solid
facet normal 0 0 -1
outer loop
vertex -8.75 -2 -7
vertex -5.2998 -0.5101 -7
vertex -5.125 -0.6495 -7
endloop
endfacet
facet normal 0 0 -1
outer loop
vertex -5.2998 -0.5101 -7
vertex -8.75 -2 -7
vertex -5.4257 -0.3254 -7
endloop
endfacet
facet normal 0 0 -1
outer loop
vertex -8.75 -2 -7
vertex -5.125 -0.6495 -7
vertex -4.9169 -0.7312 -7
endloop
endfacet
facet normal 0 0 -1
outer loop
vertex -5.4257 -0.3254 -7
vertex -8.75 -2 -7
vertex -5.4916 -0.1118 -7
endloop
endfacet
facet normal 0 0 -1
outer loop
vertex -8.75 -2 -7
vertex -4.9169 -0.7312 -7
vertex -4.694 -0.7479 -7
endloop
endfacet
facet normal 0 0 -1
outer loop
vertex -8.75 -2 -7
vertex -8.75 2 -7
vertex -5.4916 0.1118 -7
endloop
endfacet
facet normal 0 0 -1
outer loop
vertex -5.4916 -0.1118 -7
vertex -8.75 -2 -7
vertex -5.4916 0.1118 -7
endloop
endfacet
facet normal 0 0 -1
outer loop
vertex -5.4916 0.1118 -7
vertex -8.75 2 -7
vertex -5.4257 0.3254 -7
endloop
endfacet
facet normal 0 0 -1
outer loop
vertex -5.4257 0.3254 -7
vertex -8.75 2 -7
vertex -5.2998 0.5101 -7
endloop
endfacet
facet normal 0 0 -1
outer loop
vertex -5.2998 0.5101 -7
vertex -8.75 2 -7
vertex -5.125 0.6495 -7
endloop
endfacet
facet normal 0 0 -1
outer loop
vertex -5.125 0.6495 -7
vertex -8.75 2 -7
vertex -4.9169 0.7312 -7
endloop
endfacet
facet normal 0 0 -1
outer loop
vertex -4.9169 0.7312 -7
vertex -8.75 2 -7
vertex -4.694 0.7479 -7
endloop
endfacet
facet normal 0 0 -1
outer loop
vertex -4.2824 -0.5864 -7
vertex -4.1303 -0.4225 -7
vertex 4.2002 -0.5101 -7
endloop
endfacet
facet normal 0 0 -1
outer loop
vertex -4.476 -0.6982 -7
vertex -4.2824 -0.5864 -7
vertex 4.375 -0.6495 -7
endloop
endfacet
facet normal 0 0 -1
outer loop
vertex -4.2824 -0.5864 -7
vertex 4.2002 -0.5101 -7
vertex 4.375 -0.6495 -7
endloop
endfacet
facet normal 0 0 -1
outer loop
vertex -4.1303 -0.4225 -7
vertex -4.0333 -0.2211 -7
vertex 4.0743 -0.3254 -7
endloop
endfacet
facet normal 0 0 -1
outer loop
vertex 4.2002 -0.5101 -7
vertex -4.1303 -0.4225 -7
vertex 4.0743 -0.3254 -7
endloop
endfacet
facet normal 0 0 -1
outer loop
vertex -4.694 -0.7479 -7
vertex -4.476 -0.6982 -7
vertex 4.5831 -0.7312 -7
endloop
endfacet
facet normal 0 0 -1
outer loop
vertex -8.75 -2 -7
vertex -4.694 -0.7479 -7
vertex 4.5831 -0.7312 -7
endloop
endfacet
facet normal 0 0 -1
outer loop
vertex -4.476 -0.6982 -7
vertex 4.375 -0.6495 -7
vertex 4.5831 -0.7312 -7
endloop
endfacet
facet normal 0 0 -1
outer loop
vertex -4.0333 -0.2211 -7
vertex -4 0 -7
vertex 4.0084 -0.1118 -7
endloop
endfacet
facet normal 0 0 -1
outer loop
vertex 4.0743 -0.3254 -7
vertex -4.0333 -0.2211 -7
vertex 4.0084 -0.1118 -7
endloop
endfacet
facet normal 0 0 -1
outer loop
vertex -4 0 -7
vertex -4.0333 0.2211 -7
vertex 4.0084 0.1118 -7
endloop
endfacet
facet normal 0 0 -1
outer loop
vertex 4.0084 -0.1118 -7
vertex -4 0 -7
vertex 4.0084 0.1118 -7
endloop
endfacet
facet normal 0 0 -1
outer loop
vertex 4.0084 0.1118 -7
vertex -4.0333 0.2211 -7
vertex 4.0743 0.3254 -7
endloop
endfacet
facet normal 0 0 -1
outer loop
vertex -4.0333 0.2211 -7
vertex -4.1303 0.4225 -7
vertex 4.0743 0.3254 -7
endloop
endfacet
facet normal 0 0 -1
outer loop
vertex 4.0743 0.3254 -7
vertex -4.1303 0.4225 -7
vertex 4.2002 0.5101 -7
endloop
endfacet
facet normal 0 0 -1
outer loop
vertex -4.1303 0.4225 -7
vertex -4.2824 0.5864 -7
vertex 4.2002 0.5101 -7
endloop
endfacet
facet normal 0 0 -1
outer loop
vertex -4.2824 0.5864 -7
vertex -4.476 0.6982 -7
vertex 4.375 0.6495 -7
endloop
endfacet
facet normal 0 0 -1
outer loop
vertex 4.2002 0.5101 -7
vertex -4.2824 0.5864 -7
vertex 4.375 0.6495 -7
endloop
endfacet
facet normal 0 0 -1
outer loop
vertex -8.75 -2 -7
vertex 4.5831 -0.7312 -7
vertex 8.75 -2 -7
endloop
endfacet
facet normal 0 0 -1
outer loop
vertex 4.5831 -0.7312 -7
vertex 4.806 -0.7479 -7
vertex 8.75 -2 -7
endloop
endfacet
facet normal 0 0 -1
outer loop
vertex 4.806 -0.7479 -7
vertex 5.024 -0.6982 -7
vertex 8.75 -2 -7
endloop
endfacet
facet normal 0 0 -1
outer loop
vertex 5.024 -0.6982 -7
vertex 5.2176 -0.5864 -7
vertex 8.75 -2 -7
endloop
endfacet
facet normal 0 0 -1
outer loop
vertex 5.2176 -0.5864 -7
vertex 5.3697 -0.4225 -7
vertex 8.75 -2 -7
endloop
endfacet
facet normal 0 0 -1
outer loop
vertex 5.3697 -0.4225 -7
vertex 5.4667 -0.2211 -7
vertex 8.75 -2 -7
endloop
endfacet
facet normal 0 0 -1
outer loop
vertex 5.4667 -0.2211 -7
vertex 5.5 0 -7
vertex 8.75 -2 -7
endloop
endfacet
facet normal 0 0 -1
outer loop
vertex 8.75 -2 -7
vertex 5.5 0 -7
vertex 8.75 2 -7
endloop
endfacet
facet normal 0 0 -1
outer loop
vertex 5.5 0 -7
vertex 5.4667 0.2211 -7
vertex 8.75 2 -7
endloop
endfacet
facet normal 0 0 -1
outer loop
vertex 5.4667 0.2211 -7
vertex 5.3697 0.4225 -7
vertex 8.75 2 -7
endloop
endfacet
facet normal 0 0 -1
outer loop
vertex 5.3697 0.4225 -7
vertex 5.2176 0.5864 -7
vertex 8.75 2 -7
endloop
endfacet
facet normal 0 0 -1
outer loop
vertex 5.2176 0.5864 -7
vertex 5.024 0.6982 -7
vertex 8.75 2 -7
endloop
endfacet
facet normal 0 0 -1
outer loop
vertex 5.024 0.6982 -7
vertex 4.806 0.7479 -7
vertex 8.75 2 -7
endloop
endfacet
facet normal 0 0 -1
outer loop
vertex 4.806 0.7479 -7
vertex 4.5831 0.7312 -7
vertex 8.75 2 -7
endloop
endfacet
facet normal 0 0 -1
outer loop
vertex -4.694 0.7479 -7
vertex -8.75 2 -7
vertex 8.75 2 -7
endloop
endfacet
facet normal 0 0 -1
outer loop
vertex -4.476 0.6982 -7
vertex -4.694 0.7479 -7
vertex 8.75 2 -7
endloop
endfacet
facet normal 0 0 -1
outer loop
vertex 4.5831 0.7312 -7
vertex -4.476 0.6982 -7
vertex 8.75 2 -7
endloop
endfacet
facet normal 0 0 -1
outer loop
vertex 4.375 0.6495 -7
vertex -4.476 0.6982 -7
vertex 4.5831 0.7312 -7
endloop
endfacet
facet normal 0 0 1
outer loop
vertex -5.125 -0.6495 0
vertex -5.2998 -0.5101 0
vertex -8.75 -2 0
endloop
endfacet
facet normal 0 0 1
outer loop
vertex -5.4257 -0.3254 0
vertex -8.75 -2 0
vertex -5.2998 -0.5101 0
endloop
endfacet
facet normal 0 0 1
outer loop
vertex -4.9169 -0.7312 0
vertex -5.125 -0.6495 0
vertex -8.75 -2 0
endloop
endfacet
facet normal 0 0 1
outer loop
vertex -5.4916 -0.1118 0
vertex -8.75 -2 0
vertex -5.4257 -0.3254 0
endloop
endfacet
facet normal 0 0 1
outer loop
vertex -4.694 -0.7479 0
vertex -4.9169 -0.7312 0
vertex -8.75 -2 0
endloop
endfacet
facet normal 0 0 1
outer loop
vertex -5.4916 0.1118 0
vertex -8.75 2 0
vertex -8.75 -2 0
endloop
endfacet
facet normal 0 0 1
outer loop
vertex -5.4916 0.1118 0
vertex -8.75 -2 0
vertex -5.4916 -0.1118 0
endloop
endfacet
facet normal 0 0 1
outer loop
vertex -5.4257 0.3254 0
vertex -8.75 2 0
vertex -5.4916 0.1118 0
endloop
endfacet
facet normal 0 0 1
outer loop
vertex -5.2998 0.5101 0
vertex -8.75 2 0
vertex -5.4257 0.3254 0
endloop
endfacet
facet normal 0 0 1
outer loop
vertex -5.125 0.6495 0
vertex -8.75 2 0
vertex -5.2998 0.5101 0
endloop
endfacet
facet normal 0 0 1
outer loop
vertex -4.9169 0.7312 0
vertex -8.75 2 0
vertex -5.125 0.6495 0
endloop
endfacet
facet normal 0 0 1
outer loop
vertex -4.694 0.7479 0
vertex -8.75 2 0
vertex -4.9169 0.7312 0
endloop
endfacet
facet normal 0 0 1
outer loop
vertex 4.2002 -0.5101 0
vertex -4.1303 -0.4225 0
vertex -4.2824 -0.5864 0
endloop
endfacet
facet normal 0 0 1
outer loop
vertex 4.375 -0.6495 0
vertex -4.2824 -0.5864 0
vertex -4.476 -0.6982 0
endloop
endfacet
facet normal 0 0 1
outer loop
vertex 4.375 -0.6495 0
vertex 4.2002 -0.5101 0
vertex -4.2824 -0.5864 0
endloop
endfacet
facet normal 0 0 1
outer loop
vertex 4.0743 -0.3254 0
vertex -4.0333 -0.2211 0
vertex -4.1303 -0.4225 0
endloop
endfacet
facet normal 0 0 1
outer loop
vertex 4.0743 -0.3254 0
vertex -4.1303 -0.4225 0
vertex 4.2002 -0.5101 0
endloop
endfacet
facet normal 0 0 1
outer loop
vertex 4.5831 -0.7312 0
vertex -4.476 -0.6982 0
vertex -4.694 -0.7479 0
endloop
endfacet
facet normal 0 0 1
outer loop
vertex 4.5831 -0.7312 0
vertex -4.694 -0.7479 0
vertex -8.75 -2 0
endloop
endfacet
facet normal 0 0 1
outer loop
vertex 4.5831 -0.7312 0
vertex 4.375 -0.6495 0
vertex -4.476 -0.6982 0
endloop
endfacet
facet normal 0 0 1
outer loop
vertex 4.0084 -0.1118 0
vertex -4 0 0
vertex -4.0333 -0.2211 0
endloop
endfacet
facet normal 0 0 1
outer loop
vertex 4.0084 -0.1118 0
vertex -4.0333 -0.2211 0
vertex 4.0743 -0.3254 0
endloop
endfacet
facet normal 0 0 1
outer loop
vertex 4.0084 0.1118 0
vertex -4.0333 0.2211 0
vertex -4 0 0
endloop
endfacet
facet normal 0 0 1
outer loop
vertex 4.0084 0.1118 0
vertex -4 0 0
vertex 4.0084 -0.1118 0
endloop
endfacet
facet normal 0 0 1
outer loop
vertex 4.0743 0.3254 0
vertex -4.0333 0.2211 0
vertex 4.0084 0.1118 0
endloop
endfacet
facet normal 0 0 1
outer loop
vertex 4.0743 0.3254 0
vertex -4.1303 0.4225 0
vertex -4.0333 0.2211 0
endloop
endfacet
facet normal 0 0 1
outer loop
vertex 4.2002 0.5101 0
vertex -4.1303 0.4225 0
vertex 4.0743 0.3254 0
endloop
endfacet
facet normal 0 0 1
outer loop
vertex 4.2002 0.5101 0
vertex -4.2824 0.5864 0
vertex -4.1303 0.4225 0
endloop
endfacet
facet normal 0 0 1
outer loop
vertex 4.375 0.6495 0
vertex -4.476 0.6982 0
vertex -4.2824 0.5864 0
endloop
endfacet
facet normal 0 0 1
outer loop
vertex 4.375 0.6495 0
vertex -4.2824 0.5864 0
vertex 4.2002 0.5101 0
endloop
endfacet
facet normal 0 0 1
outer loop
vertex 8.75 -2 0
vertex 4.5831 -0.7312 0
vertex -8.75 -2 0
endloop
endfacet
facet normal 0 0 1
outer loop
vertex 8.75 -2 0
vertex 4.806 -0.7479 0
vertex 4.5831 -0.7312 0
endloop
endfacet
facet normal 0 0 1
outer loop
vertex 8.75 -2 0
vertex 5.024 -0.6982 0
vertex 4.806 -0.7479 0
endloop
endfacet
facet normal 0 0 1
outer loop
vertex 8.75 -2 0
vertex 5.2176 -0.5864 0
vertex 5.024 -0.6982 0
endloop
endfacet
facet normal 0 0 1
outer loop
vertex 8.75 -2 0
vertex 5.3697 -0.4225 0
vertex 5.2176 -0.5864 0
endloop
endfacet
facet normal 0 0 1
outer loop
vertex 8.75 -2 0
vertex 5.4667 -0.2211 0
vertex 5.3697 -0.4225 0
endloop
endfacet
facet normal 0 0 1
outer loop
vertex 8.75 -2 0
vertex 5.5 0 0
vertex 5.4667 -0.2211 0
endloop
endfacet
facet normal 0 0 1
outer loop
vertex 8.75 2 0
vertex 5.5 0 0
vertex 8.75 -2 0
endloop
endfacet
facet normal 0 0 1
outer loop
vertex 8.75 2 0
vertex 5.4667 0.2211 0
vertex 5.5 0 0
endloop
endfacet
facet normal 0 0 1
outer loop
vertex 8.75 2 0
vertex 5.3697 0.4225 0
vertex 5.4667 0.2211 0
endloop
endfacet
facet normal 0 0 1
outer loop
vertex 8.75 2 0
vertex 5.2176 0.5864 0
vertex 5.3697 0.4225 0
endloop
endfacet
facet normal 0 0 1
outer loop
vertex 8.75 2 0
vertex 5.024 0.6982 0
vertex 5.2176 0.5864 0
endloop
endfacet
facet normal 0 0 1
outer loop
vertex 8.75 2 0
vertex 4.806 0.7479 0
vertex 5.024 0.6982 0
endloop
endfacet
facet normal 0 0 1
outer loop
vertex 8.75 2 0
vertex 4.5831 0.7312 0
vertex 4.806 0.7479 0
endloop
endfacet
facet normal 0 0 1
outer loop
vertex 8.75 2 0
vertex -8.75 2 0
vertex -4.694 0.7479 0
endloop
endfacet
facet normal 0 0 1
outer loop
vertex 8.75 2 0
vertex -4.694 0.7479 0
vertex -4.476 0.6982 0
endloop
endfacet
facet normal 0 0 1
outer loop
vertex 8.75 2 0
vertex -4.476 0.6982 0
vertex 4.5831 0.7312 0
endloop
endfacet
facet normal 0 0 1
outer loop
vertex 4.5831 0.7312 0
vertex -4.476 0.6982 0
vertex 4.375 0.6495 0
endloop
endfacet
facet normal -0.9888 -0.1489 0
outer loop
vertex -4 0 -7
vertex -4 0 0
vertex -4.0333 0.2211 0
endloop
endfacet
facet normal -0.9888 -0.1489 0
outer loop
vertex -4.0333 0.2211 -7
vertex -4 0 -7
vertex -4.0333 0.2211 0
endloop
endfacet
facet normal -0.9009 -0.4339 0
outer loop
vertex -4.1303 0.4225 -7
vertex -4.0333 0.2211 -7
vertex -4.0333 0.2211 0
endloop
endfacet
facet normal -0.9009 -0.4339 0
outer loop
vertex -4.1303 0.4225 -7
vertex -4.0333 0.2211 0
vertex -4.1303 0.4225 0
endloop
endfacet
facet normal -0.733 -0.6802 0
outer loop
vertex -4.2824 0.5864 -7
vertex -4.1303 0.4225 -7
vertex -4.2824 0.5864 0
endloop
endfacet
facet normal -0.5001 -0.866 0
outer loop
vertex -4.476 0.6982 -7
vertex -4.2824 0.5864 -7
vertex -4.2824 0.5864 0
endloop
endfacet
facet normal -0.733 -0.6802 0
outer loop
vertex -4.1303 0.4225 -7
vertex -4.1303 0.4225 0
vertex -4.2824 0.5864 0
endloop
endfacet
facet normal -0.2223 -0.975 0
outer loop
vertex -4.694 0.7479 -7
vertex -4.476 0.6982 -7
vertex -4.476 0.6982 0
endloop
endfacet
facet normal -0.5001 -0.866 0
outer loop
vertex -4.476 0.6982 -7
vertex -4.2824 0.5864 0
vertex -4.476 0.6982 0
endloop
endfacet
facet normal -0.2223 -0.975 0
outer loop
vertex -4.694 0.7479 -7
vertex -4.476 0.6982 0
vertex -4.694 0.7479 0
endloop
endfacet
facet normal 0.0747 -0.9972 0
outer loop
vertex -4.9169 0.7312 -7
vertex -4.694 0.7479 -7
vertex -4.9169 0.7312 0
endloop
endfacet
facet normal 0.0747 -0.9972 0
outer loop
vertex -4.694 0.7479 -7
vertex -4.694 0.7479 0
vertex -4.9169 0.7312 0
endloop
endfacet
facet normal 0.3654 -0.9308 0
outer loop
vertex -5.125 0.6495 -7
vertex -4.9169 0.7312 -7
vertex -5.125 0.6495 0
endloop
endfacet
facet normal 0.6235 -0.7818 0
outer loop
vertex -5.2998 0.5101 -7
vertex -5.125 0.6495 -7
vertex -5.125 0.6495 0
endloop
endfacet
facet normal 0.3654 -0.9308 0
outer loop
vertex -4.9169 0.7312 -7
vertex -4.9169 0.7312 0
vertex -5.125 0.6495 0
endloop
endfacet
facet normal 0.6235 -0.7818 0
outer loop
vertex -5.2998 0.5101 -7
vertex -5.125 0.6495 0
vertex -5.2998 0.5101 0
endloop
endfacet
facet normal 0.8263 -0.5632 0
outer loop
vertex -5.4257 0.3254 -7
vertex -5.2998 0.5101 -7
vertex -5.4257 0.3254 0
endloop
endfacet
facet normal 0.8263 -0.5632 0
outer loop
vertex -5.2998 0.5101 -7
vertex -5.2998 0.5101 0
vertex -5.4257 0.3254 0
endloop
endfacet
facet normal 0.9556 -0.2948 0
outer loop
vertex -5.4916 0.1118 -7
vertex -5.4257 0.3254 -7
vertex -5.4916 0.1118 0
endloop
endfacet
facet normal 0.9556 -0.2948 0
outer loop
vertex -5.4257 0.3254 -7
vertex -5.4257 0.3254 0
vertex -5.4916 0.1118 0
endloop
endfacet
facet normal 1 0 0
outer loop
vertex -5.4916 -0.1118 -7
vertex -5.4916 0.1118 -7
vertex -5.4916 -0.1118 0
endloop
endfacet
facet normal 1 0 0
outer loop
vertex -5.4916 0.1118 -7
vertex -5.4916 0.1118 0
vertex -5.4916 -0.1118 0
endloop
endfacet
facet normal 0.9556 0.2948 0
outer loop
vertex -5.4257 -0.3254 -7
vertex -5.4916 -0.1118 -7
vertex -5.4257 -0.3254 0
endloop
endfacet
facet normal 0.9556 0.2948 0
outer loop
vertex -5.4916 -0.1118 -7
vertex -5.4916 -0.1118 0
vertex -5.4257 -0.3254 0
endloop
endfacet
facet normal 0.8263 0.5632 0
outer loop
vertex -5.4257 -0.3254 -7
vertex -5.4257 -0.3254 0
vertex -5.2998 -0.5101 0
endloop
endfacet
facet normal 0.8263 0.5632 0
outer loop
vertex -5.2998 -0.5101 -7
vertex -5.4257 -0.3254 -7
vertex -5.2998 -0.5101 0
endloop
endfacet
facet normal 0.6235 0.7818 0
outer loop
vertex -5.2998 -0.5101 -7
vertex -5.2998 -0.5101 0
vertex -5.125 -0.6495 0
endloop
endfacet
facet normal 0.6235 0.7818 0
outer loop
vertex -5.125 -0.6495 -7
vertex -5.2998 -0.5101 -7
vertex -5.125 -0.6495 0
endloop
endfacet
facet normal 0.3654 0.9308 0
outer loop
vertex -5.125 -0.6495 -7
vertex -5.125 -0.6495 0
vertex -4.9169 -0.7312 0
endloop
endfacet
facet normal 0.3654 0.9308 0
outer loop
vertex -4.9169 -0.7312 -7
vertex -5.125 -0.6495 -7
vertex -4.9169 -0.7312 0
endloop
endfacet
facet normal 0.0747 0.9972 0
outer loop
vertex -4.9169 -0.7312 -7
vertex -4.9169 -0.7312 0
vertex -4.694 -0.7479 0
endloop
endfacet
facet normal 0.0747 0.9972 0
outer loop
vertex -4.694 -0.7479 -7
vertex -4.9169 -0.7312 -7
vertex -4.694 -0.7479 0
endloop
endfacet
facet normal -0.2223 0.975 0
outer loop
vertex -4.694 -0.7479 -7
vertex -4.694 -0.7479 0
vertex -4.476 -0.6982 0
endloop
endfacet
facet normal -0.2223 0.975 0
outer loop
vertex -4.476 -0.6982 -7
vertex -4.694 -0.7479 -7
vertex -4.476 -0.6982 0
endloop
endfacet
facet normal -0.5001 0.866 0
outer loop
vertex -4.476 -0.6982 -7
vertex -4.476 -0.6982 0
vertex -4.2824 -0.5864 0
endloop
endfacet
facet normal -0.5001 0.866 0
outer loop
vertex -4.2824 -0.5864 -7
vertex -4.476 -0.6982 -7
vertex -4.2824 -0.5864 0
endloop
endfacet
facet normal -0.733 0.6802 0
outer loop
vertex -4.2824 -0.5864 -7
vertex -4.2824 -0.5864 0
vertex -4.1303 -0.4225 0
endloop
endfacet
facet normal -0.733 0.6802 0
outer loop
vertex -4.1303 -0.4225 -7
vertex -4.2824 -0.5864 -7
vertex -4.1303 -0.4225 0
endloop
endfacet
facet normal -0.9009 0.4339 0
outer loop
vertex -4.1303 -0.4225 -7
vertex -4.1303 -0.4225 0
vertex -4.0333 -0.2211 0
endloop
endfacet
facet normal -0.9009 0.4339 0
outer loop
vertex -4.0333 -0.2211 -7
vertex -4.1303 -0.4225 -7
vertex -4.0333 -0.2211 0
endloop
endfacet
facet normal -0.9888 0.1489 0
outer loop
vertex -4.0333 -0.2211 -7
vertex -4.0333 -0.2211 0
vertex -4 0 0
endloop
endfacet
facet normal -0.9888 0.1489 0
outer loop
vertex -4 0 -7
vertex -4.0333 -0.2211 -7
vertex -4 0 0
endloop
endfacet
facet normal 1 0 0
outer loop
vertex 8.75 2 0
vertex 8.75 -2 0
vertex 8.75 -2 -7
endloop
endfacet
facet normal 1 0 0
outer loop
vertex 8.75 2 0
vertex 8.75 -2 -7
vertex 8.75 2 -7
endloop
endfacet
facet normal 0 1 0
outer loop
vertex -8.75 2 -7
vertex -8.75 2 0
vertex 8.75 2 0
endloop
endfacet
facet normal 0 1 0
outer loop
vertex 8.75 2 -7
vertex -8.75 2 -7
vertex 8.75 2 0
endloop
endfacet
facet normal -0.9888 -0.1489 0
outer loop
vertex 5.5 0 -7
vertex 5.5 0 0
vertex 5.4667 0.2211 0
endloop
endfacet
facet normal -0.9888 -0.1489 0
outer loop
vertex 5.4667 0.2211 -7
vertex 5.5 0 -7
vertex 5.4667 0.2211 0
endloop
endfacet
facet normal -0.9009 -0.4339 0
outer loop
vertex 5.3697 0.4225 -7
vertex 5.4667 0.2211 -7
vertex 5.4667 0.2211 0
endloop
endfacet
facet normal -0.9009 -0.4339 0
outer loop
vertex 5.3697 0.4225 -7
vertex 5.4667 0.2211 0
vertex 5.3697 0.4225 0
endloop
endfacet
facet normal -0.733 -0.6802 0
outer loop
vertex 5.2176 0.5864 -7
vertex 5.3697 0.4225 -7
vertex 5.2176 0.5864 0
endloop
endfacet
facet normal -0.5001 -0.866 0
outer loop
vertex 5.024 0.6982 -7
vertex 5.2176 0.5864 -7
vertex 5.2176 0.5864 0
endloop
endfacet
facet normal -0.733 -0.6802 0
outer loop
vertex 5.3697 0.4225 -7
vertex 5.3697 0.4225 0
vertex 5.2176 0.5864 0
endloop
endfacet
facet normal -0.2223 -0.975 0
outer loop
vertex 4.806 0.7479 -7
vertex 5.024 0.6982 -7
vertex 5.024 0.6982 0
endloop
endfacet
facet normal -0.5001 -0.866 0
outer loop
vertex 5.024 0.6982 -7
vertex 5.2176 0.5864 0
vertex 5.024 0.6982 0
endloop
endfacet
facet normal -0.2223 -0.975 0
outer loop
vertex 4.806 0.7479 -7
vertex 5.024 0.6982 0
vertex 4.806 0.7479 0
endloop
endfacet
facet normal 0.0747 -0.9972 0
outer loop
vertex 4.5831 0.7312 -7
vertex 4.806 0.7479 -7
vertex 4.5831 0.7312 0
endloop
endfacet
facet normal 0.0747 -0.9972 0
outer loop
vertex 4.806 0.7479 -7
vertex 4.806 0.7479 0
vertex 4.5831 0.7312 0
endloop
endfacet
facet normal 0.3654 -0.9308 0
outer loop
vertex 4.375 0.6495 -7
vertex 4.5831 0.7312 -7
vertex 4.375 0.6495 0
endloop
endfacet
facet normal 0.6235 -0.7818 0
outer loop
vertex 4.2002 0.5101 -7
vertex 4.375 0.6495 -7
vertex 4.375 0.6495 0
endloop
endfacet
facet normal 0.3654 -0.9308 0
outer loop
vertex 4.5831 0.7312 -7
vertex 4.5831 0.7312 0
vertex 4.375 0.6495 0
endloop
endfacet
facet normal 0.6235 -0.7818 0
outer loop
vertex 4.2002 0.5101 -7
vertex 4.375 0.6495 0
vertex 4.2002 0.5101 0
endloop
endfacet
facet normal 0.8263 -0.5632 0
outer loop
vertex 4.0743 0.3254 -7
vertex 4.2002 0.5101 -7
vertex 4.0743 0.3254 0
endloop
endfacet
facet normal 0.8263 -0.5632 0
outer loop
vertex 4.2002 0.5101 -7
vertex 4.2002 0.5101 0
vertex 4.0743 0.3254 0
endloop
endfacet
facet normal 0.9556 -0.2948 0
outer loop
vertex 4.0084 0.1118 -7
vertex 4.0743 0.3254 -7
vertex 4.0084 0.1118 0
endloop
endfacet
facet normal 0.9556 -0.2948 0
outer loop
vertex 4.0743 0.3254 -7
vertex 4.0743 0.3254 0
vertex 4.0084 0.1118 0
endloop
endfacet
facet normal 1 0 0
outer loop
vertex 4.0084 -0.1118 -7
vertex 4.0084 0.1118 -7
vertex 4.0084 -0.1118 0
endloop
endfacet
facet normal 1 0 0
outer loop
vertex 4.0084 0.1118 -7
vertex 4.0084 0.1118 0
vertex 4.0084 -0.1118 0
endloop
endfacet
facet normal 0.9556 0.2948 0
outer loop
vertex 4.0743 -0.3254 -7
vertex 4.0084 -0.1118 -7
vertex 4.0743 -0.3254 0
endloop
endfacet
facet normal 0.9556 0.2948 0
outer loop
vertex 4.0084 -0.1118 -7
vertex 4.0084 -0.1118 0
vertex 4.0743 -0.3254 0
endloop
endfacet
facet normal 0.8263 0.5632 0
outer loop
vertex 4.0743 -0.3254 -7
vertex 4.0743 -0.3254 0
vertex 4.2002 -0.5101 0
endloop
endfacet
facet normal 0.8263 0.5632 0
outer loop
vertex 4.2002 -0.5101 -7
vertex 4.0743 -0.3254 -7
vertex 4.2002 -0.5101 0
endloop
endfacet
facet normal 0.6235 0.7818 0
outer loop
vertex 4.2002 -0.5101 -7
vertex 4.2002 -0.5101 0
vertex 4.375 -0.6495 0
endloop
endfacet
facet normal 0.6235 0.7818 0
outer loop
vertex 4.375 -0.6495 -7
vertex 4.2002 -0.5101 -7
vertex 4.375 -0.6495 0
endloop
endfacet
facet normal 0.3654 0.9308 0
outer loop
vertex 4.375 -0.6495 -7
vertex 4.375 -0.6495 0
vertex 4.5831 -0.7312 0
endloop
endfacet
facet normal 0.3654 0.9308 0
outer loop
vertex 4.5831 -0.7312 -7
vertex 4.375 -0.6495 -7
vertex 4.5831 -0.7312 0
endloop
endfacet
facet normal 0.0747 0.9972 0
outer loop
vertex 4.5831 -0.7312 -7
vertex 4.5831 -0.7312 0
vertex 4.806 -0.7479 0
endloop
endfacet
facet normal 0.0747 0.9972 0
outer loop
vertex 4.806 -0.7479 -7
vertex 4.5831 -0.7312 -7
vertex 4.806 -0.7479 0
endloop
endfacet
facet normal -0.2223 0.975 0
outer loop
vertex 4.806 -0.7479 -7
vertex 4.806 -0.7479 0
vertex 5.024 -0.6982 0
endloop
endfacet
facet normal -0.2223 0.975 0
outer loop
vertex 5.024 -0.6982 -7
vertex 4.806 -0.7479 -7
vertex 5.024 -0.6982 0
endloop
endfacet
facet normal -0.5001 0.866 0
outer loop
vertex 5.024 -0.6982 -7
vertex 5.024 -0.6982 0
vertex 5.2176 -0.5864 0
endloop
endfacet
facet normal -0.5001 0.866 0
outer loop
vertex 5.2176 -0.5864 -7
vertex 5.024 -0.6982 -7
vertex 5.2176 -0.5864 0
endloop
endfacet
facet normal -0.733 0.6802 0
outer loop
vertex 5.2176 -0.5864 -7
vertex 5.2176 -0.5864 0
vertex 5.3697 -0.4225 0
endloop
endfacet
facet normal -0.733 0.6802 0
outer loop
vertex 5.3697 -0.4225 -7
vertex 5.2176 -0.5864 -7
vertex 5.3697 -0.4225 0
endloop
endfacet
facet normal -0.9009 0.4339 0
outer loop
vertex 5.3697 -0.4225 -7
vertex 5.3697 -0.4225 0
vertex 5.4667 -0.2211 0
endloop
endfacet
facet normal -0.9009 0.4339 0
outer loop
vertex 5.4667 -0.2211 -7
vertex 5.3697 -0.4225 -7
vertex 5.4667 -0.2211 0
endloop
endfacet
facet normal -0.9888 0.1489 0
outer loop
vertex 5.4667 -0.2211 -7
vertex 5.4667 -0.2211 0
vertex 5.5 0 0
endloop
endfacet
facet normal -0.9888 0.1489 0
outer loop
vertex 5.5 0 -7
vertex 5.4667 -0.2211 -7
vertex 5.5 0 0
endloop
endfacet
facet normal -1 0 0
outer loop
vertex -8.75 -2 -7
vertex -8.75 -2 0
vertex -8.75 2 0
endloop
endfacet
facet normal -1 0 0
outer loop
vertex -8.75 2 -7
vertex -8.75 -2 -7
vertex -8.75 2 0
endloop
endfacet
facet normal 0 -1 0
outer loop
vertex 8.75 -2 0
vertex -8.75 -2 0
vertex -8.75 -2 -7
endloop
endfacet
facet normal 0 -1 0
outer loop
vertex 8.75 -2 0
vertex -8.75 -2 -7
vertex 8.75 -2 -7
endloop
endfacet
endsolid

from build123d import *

# Parameters (mm, degrees)
SKETCH1_W           = 17.5
SKETCH1_H           = 4
BOSS_EXTRUDE1_DEPTH = 7
CUT_EXTRUDE1_REACH  = 13.383
SKETCH3_R           = 0.75


with BuildPart() as part:
    # Sketch1 → Boss-Extrude1 (new body)
    with BuildSketch(Plane.XY):
        Rectangle(SKETCH1_W, SKETCH1_H)
    extrude(amount=-BOSS_EXTRUDE1_DEPTH)

    # Sketch3 → Cut-Extrude1 (cut, up to next)
    with BuildSketch(Plane.XY, mode=Mode.PRIVATE) as cut_extrude1_sk1:
        with Locations((-4.75, 0)):
            Circle(SKETCH3_R)
    cut_extrude1_tool1 = extrude(cut_extrude1_sk1.sketch, amount=-CUT_EXTRUDE1_REACH, mode=Mode.PRIVATE) & part.part
    # Sketch3 → Cut-Extrude1 (cut, up to next)
    with BuildSketch(Plane.XY, mode=Mode.PRIVATE) as cut_extrude1_sk2:
        with Locations((4.75, 0)):
            Circle(SKETCH3_R)
    cut_extrude1_tool2 = extrude(cut_extrude1_sk2.sketch, amount=-CUT_EXTRUDE1_REACH, mode=Mode.PRIVATE) & part.part
    add(cut_extrude1_tool1.solids().sort_by_distance((-4.75, 0, 0))[0], mode=Mode.SUBTRACT)
    add(cut_extrude1_tool2.solids().sort_by_distance((4.75, 0, 0))[0], mode=Mode.SUBTRACT)


solid = part.part
